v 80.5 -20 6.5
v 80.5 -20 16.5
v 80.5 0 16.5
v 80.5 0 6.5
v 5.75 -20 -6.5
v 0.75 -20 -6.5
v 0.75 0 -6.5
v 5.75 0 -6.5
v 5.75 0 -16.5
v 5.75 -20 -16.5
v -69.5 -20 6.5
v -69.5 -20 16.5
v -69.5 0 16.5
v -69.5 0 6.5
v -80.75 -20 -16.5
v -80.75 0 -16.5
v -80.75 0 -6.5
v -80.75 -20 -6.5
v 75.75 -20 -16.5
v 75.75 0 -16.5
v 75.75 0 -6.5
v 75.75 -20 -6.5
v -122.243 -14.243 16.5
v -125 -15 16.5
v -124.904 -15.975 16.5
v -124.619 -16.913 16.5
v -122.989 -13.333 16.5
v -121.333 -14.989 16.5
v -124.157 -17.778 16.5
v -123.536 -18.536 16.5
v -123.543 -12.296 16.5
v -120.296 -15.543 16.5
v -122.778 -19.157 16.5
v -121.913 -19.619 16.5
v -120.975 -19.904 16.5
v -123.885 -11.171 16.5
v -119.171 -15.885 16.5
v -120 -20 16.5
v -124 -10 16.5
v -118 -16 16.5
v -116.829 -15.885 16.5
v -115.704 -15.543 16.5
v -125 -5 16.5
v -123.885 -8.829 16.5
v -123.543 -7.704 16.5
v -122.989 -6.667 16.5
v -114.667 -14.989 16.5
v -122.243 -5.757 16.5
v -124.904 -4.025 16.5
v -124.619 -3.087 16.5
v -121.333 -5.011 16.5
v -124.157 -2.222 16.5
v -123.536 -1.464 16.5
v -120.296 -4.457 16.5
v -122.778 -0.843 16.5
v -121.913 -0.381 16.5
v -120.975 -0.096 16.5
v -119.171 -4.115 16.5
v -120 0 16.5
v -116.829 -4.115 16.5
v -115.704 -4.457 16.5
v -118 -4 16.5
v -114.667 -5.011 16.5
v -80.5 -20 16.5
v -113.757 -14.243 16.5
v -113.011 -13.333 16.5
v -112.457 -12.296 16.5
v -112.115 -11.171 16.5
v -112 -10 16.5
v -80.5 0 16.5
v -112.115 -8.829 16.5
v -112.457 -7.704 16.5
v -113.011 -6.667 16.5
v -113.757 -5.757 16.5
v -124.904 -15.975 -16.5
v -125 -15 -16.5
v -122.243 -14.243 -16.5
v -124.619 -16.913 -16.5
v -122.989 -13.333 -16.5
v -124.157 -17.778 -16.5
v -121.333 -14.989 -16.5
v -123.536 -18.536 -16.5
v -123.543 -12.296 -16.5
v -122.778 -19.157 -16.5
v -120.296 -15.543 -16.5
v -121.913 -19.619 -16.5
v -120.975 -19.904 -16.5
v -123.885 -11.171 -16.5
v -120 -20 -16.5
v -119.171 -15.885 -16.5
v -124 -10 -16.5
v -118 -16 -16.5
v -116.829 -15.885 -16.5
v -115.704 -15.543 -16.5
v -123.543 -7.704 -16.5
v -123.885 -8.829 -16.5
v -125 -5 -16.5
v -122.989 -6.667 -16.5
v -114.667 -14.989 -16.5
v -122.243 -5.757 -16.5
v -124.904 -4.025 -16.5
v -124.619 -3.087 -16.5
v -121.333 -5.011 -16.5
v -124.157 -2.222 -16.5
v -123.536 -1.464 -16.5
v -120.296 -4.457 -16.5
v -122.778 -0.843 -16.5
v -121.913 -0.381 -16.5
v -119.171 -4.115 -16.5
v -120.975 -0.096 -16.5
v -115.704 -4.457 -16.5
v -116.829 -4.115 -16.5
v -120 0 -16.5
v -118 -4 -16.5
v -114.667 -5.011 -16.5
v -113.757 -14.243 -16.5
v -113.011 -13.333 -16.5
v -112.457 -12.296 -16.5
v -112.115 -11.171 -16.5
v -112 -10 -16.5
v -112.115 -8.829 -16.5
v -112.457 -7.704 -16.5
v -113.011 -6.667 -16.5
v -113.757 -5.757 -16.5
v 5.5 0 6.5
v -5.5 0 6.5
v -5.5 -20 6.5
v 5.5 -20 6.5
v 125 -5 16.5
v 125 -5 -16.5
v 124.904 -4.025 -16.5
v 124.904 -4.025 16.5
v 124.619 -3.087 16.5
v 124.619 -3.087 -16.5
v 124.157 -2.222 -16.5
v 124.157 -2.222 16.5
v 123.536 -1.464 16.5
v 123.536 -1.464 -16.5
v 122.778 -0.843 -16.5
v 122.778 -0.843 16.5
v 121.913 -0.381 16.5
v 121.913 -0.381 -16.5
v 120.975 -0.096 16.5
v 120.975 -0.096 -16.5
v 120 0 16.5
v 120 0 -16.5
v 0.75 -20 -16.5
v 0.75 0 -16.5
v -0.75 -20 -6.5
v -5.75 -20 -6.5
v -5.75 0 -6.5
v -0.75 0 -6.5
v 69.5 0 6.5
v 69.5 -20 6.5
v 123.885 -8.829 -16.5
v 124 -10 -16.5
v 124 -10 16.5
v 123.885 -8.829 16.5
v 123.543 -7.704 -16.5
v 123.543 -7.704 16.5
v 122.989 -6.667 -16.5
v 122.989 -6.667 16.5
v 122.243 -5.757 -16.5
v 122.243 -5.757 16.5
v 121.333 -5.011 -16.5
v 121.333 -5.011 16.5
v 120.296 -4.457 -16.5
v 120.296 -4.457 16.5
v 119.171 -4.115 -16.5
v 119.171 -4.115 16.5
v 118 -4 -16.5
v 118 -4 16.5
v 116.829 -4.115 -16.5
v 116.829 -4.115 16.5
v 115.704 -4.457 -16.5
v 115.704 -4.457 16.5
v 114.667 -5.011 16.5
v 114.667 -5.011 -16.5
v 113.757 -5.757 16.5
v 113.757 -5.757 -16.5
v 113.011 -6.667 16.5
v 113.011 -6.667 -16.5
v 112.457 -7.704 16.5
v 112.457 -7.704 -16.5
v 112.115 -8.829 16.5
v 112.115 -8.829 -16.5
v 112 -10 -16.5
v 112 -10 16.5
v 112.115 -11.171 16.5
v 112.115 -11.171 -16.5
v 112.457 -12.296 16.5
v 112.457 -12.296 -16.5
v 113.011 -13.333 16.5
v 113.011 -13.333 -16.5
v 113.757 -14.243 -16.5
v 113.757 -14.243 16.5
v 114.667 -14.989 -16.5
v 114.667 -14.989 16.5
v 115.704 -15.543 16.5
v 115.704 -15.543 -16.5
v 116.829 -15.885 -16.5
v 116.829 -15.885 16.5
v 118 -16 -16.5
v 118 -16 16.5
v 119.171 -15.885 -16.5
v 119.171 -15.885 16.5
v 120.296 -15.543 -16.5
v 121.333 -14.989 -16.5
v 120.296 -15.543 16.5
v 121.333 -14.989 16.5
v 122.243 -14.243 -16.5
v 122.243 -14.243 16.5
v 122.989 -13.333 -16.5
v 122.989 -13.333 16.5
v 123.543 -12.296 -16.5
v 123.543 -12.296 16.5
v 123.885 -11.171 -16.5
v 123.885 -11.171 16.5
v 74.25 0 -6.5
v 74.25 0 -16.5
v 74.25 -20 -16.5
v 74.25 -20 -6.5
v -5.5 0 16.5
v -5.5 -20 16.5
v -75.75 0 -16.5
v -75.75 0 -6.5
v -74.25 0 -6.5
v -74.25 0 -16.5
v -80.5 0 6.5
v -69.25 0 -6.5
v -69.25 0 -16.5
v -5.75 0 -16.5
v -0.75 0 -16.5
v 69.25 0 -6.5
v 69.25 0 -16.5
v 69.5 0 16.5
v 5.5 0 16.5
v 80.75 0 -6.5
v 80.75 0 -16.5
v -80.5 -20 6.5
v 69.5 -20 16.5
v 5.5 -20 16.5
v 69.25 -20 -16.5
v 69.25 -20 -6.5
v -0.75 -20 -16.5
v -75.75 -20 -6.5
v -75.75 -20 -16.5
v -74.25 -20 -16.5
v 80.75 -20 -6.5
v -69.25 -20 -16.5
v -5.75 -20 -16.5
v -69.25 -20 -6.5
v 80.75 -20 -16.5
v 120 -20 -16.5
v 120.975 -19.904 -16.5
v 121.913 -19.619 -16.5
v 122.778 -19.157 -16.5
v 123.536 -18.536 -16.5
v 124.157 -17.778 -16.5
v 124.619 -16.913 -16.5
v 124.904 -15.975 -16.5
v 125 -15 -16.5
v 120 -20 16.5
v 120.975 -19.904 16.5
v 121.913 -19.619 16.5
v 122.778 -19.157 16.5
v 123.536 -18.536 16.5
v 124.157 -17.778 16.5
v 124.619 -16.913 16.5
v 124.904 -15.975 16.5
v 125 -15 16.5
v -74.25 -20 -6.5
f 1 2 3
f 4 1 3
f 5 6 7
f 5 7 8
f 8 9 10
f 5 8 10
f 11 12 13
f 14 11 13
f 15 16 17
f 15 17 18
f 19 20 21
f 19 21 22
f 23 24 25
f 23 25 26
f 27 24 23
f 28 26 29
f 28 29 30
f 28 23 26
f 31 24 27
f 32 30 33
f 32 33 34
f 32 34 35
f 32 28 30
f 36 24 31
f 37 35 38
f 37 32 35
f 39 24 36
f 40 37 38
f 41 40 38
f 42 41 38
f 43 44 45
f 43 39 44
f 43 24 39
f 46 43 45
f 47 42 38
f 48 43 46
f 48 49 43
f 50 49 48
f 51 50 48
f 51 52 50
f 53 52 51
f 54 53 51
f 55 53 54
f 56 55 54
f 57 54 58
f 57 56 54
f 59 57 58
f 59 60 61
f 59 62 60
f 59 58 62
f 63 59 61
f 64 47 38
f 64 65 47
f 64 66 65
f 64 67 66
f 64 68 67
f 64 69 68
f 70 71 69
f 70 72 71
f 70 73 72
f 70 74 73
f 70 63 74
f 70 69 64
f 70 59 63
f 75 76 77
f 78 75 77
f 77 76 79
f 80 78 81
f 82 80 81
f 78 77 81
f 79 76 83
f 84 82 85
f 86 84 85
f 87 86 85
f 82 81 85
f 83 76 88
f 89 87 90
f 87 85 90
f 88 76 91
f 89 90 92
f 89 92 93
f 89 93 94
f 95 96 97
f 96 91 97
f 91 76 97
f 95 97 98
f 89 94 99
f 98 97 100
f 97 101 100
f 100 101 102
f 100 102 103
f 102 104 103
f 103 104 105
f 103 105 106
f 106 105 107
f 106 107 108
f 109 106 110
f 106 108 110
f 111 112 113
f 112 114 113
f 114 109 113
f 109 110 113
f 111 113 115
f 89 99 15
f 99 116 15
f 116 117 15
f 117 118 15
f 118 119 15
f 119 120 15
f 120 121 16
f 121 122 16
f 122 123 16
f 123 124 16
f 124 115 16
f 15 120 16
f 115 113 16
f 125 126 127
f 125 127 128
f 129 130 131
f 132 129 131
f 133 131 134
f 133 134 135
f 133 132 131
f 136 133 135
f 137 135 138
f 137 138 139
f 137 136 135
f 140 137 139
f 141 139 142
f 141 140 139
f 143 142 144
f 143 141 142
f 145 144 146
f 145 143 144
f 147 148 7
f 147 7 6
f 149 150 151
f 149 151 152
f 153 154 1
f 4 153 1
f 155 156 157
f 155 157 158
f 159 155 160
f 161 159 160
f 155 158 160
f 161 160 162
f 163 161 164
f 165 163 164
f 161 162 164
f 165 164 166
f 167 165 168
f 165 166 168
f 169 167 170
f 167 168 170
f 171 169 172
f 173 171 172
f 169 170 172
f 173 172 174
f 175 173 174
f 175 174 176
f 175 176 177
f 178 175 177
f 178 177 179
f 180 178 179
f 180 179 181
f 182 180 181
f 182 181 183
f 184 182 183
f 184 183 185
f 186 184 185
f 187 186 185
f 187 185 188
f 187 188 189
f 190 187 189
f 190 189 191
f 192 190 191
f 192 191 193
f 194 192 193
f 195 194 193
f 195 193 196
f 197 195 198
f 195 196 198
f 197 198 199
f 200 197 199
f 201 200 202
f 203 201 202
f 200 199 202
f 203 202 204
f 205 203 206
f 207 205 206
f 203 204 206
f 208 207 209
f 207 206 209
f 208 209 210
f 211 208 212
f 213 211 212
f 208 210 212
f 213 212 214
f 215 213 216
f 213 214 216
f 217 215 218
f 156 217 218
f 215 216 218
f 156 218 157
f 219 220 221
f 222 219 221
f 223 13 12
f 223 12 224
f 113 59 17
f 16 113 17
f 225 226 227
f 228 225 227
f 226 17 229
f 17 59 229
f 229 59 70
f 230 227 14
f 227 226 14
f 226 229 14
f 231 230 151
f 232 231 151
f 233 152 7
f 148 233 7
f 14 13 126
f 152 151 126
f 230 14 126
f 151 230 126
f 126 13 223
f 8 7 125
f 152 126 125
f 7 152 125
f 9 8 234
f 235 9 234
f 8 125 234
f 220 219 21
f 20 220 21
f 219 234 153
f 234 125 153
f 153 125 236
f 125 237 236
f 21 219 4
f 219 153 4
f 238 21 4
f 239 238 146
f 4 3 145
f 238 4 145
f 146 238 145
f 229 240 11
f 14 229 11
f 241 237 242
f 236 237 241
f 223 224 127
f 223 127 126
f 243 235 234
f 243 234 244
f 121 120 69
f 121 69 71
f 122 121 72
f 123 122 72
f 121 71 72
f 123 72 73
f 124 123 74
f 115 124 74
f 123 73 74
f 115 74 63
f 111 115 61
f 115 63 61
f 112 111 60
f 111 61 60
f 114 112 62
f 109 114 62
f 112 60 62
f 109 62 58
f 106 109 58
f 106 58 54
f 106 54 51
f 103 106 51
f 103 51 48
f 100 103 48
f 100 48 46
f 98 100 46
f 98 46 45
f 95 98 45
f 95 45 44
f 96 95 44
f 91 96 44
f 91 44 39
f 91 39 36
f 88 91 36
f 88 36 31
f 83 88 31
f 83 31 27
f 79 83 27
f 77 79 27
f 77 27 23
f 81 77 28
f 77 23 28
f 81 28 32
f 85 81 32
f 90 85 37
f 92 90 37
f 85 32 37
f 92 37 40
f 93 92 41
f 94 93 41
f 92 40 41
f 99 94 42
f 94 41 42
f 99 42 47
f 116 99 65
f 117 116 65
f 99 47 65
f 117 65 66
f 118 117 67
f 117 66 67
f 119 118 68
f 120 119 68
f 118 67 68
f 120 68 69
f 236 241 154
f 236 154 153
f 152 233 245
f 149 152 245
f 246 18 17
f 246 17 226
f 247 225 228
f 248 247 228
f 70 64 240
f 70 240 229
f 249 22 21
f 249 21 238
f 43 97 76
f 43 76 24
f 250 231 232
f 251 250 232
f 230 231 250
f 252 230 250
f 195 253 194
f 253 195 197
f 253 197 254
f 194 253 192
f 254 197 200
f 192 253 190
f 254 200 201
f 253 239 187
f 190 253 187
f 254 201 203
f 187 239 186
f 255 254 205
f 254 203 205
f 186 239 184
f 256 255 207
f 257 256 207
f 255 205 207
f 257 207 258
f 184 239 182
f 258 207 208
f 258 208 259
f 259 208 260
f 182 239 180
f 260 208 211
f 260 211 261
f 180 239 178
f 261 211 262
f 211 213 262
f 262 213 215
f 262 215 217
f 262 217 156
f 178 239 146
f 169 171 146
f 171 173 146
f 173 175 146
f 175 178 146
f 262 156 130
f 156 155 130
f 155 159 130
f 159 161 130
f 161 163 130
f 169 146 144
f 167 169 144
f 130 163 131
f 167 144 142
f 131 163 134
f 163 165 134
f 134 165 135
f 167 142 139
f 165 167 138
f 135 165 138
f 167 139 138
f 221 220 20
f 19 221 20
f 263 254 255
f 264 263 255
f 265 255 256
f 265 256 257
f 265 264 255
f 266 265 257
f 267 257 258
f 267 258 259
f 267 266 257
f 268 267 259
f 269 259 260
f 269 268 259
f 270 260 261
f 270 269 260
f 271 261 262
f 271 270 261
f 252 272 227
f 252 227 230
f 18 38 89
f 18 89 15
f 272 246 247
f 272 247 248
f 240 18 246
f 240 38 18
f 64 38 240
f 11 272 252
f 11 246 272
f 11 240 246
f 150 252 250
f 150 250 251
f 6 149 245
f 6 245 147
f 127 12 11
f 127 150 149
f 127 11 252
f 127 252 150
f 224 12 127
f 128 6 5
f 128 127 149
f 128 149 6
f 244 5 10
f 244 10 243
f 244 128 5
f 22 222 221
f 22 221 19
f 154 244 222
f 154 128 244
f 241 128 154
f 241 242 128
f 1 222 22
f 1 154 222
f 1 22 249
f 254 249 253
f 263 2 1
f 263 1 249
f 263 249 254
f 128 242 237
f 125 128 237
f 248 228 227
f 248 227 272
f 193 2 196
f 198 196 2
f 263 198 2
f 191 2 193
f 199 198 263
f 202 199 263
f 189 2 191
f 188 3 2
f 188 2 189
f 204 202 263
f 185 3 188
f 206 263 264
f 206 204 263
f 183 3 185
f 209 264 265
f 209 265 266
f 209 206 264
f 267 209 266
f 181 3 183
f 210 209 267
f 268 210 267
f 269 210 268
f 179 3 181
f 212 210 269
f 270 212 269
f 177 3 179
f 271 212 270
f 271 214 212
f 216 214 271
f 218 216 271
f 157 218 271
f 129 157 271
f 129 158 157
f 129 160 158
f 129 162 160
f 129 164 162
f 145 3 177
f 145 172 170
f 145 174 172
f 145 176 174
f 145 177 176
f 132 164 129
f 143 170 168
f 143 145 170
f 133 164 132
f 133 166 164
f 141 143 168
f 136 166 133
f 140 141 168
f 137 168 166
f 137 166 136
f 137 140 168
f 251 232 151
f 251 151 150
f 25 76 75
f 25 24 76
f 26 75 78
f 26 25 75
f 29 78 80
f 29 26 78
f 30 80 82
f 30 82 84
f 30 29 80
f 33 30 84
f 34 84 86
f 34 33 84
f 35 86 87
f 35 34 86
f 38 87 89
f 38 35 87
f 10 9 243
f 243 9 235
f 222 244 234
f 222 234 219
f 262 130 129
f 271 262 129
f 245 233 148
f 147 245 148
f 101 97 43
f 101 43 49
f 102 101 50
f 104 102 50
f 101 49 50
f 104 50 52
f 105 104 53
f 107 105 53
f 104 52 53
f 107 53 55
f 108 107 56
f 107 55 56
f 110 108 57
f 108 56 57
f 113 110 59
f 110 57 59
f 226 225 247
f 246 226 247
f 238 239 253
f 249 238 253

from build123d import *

# Parameters (mm, degrees)
F0_W      = 250
F0_H      = 33
F1_DEPTH  = 20
F2_W      = 11
F2_H      = 20
F4_DEPTH  = 10
F3_W      = 5
F3_H      = 20
F5_DEPTH  = 10
F6_R      = 5
F7_R      = 5
F8_R      = 5
F9_R      = 5
F10_R     = 6
F11_DEPTH = 33.001


with BuildPart() as f1:
    # F0 (on Front) → F1 (new body)
    with BuildSketch(Plane.XZ):
        Rectangle(F0_W, F0_H)
    extrude(amount=F1_DEPTH)

    # F2 (on face) → F4 (cut)
    with BuildSketch(Plane.XY.offset(16.5)):
        with Locations((-75, -10)):
            Rectangle(F2_W, F2_H)
        with Locations((0, -10)):
            Rectangle(F2_W, F2_H)
        with Locations((75, -10)):
            Rectangle(F2_W, F2_H)
    extrude(amount=-F4_DEPTH, mode=Mode.SUBTRACT)

    # F3 (on face) → F5 (cut)
    with BuildSketch(Plane(origin=(0, 0, -16.5), x_dir=(1, 0, 0), z_dir=(0, 0, -1))):
        with Locations((-78.25, 10)):
            Rectangle(F3_W, F3_H)
        with Locations((-71.75, 10)):
            Rectangle(F3_W, F3_H)
        with Locations((-3.25, 10)):
            Rectangle(F3_W, F3_H)
        with Locations((3.25, 10)):
            Rectangle(F3_W, F3_H)
        with Locations((71.75, 10)):
            Rectangle(F3_W, F3_H)
        with Locations((78.25, 10)):
            Rectangle(F3_W, F3_H)
    extrude(amount=-F5_DEPTH, mode=Mode.SUBTRACT)

    # F6
    f6_edges = [f1.edges().sort_by_distance(p)[0] for p in [
        (-125, -20, 0),
    ]]
    fillet(f6_edges, radius=F6_R)

    # F7
    f7_edges = [f1.edges().sort_by_distance(p)[0] for p in [
        (-125, 0, 0),
    ]]
    fillet(f7_edges, radius=F7_R)

    # F8
    f8_edges = [f1.edges().sort_by_distance(p)[0] for p in [
        (125, -20, 0),
    ]]
    fillet(f8_edges, radius=F8_R)

    # F9
    f9_edges = [f1.edges().sort_by_distance(p)[0] for p in [
        (125, 0, 0),
    ]]
    fillet(f9_edges, radius=F9_R)

    # F10 (on face) → F11 (cut, through all)
    with BuildSketch(Plane.XY.offset(16.5)):
        with Locations((118, -10)):
            Circle(F10_R)
        with Locations((-118, -10)):
            Circle(F10_R)
    extrude(amount=-F11_DEPTH, mode=Mode.SUBTRACT)


solid = f1.part
